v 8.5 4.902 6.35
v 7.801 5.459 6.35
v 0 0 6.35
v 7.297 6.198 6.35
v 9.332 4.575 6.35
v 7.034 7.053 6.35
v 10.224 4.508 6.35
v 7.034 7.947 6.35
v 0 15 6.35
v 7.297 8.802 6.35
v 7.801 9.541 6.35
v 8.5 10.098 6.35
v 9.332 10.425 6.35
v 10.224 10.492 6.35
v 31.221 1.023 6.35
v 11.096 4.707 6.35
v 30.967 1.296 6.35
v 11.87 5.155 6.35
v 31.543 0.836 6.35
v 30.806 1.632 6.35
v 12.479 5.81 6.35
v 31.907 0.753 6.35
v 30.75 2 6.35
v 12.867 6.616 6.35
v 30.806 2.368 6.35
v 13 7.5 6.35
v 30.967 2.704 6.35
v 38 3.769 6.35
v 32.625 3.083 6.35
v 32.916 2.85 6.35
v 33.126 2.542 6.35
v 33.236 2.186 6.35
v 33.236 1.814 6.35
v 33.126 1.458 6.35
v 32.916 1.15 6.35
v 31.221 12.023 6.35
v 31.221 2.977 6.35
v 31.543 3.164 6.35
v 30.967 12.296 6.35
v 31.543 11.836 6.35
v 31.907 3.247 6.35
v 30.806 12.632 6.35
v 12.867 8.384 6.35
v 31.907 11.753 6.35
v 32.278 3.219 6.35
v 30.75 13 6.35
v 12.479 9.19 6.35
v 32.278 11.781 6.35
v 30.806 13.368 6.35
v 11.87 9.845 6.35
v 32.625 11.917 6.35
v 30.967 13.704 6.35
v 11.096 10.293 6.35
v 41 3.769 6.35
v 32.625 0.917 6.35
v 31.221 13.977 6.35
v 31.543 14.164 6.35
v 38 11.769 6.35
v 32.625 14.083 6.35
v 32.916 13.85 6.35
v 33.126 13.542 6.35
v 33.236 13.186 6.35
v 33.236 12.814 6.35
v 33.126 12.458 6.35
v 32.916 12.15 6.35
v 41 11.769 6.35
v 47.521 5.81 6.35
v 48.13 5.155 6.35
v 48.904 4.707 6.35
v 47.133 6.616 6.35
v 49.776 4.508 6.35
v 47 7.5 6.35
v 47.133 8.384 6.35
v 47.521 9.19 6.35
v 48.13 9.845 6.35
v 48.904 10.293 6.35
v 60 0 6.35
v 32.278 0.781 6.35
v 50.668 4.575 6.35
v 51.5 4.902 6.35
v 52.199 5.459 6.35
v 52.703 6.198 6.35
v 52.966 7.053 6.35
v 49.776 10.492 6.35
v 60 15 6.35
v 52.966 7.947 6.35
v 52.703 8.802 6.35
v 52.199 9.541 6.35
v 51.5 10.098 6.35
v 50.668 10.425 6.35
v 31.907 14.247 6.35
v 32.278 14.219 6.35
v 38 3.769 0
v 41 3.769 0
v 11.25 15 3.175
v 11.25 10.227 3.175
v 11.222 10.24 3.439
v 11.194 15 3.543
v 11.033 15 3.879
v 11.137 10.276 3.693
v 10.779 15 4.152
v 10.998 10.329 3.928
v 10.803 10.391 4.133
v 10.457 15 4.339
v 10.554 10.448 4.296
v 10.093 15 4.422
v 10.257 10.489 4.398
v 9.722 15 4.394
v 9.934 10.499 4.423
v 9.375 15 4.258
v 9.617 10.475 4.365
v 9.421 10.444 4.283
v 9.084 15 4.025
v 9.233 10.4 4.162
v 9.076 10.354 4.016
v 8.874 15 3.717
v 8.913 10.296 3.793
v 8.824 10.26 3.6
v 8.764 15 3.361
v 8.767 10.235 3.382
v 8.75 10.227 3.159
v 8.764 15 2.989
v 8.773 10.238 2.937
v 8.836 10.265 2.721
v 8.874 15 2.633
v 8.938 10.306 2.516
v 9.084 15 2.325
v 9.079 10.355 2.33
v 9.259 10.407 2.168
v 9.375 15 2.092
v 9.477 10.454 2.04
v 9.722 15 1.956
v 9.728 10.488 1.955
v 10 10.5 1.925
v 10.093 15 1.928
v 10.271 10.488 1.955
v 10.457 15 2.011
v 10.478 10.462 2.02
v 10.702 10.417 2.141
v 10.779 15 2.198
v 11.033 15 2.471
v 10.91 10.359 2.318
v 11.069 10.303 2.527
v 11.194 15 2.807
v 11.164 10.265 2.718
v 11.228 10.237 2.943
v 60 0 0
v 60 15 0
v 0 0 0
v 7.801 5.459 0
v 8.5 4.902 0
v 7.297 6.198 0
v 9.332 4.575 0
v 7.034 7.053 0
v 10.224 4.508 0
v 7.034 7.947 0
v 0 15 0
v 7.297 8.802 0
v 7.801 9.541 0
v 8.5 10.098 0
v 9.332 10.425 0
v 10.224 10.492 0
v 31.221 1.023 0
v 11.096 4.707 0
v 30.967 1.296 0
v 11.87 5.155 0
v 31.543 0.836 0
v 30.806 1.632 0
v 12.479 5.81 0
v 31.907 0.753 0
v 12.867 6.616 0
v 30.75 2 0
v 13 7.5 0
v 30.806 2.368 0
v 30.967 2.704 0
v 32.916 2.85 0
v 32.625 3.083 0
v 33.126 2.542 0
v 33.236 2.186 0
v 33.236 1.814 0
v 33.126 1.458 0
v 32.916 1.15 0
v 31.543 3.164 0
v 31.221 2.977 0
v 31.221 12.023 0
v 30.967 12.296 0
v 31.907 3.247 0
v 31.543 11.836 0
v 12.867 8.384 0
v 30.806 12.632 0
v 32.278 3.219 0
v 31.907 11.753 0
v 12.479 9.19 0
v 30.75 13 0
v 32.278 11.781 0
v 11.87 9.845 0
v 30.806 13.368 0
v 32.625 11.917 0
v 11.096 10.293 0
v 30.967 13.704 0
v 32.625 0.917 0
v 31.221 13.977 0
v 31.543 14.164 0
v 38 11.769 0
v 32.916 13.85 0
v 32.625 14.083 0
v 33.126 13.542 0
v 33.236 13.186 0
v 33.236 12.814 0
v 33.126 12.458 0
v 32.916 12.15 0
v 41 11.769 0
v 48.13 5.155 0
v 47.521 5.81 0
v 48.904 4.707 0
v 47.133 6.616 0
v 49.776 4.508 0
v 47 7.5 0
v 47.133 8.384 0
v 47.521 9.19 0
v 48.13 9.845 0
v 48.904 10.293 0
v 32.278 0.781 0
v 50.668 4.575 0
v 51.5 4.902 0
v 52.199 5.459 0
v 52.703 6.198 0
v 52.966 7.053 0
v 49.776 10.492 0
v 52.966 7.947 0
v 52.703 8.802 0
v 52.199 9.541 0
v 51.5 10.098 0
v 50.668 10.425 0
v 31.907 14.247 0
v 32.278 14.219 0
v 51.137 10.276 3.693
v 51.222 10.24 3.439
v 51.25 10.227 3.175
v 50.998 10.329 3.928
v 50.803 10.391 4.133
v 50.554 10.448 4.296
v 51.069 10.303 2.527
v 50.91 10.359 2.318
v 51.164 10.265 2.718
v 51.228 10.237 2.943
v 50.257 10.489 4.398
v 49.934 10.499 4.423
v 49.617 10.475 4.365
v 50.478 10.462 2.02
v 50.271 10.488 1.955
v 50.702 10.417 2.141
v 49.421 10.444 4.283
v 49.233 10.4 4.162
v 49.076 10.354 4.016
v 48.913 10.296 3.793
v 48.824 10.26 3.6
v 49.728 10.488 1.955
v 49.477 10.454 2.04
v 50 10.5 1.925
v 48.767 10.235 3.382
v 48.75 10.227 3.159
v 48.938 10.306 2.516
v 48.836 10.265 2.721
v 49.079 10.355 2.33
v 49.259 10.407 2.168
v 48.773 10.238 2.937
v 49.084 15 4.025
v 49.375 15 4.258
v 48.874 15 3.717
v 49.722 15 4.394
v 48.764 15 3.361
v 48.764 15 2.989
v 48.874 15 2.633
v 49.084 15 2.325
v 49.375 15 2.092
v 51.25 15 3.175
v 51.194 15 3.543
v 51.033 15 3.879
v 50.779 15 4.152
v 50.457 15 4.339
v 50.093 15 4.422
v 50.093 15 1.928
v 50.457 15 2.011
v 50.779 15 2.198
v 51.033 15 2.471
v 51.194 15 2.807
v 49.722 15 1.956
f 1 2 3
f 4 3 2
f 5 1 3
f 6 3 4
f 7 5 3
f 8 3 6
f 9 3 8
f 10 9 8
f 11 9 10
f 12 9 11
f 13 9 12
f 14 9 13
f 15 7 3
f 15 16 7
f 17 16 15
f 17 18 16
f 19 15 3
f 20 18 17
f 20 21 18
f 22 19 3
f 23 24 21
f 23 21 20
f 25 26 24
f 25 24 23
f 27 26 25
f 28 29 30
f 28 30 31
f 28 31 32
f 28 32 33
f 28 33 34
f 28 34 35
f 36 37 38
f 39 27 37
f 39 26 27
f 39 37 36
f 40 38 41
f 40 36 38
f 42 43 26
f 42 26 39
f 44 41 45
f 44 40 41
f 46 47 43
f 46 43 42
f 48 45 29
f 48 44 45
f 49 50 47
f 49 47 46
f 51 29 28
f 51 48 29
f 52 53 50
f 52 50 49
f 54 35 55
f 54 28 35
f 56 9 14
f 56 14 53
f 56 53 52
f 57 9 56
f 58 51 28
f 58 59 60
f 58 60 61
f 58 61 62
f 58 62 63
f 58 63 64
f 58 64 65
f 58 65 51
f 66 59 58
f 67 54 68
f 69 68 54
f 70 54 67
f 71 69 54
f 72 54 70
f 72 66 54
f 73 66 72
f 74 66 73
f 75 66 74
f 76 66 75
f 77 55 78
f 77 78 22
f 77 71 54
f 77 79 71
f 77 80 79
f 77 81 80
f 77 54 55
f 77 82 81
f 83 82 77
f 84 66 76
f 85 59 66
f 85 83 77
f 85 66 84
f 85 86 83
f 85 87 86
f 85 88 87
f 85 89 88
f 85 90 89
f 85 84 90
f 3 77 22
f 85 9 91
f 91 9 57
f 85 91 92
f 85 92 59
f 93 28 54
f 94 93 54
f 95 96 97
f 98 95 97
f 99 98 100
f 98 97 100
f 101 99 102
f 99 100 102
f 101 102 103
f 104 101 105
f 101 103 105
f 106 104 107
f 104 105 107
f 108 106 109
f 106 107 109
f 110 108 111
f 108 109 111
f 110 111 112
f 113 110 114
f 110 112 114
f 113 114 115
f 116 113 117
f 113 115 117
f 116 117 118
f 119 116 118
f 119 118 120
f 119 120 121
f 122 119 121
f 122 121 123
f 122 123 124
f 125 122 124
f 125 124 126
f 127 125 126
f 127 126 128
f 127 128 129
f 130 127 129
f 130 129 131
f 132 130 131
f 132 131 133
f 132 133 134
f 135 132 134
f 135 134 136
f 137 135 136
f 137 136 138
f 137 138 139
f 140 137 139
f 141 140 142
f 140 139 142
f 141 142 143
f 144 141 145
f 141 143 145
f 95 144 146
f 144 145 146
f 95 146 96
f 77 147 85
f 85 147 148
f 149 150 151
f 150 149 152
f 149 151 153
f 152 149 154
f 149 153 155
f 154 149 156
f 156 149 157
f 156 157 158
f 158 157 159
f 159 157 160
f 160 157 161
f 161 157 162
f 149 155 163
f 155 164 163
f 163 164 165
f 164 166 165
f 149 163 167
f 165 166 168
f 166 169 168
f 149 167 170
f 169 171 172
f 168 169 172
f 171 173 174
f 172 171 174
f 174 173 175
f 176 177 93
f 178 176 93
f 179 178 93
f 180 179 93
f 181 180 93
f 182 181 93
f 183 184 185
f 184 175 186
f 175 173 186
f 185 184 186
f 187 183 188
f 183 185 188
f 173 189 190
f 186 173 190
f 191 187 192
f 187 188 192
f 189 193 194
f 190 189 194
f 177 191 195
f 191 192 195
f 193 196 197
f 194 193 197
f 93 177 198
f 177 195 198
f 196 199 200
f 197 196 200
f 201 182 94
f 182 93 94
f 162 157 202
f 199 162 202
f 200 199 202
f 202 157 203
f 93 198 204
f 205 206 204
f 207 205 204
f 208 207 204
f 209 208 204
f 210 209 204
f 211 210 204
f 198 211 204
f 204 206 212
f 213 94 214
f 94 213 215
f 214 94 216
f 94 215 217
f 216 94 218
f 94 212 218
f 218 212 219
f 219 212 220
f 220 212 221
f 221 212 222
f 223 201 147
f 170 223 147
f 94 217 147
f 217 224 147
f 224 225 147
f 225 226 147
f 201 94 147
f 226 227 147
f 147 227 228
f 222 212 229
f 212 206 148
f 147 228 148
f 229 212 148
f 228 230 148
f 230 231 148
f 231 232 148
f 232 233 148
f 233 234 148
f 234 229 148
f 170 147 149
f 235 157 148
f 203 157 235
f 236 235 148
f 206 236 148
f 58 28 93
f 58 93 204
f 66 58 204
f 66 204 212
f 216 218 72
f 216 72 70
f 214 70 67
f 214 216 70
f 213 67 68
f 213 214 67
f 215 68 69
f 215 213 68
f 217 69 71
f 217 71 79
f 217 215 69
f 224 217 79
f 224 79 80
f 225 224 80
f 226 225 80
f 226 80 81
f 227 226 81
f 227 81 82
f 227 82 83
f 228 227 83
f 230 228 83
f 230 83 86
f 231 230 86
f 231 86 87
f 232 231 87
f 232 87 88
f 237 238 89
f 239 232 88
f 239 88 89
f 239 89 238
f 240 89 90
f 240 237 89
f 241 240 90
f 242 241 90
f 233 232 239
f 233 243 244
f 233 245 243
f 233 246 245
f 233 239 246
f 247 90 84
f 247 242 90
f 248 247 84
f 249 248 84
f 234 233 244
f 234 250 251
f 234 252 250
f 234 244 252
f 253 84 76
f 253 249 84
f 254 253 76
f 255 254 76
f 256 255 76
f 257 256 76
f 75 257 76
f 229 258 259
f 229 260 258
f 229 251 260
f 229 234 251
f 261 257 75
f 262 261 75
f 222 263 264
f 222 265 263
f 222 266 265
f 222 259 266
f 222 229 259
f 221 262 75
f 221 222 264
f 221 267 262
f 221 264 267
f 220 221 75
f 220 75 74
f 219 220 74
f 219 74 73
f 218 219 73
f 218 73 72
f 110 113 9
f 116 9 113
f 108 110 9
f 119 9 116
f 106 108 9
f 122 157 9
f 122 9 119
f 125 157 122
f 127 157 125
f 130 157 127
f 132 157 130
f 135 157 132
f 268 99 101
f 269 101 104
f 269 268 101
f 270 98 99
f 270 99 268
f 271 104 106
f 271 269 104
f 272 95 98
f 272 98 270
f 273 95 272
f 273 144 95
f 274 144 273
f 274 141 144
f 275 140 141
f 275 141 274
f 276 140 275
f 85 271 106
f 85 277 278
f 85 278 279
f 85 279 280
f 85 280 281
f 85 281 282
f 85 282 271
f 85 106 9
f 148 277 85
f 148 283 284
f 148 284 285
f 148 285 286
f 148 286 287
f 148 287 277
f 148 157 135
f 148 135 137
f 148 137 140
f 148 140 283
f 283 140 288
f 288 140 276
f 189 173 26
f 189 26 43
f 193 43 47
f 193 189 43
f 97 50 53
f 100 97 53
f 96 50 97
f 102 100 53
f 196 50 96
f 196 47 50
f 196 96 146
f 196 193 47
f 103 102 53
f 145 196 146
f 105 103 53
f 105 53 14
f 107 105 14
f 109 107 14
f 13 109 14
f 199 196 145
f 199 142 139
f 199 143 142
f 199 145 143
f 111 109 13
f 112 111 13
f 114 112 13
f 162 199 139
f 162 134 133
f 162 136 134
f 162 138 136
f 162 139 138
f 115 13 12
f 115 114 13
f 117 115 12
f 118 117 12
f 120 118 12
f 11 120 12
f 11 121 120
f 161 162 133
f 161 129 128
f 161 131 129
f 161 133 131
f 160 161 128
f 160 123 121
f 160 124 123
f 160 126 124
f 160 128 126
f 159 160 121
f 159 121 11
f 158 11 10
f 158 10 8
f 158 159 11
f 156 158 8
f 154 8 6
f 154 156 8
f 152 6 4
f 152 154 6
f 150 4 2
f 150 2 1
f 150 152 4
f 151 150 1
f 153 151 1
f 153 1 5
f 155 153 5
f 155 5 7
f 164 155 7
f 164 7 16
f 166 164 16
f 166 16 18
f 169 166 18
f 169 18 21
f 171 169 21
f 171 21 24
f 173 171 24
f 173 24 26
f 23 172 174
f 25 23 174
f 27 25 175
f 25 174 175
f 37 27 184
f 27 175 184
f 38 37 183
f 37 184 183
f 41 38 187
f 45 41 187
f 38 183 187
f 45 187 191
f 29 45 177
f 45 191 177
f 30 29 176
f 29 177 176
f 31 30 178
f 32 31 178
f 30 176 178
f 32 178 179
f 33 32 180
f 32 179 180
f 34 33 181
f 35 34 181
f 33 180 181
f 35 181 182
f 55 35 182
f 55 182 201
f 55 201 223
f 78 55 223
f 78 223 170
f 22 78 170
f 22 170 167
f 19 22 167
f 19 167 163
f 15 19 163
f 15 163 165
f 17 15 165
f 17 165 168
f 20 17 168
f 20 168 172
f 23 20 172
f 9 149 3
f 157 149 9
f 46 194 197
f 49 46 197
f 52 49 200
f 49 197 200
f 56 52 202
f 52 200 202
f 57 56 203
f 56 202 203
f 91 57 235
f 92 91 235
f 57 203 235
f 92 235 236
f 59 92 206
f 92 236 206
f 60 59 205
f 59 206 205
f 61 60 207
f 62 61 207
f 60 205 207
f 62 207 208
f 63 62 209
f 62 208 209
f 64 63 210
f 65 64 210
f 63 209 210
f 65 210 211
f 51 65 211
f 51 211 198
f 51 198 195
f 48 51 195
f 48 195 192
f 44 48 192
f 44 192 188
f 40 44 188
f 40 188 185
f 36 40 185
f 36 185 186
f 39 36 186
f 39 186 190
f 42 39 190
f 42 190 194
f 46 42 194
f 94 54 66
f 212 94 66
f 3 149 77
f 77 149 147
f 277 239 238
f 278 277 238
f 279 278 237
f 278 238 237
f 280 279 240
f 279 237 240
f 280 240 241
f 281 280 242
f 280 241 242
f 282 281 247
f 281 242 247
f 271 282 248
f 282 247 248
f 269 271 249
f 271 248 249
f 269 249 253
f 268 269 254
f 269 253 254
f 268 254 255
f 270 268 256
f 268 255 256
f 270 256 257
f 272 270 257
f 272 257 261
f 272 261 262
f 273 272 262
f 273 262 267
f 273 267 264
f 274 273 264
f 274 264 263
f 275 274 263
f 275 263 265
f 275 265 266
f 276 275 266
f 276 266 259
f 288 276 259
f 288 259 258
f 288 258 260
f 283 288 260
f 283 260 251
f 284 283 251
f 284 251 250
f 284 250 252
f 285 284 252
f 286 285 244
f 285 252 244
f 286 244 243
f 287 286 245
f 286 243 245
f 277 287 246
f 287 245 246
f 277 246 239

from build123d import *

# Parameters (mm, degrees)
SKETCH1_W             = 60
SKETCH1_H             = 15
SKETCH1_R             = 3
BOSS_EXTRUDE1_DEPTH   = 6.35
M3_TAPPED_HOLE1_D     = 2.5
M3_TAPPED_HOLE1_DEPTH = 8.5
M3_TAPPED_HOLE1_TIP   = 0.751075774
SKETCH5_W             = 3
SKETCH5_H             = 8
CUT_EXTRUDE1_DEPTH    = 63.171717881
M3_TAPPED_HOLE2_D     = 2.5


with BuildPart() as part:
    # Sketch1 → Boss-Extrude1 (new body)
    with BuildSketch(Plane.XY):
        with Locations((30, 7.5)):
            Rectangle(SKETCH1_W, SKETCH1_H)
        with Locations((10, 7.5)):
            Circle(SKETCH1_R, mode=Mode.SUBTRACT)
        with Locations((50, 7.5)):
            Circle(SKETCH1_R, mode=Mode.SUBTRACT)
    extrude(amount=BOSS_EXTRUDE1_DEPTH)

    # M3 Tapped Hole1
    with Locations(Plane(origin=(0, 15, 0), x_dir=(-1, 0, 0), z_dir=(0, 1, 0))):
        with Locations((-10, 3.175), (-50, 3.175)):
            Hole(M3_TAPPED_HOLE1_D / 2, depth=M3_TAPPED_HOLE1_DEPTH)
            with Locations((0, 0, -(M3_TAPPED_HOLE1_DEPTH + M3_TAPPED_HOLE1_TIP / 2))):  # 118° drill point
                Cone(0, M3_TAPPED_HOLE1_D / 2, M3_TAPPED_HOLE1_TIP, mode=Mode.SUBTRACT)

    # Sketch5 → Cut-Extrude1 (cut, through all)
    with BuildSketch(Plane.XY.offset(6.35)):
        with Locations((39.5, 7.769310746)):
            Rectangle(SKETCH5_W, SKETCH5_H)
    extrude(amount=-CUT_EXTRUDE1_DEPTH, mode=Mode.SUBTRACT)

    # M3 Tapped Hole2 (through all)
    with Locations(Plane.XY.offset(6.35)):
        with Locations((32, 13), (32, 2)):
            Hole(M3_TAPPED_HOLE2_D / 2)


solid = part.part
